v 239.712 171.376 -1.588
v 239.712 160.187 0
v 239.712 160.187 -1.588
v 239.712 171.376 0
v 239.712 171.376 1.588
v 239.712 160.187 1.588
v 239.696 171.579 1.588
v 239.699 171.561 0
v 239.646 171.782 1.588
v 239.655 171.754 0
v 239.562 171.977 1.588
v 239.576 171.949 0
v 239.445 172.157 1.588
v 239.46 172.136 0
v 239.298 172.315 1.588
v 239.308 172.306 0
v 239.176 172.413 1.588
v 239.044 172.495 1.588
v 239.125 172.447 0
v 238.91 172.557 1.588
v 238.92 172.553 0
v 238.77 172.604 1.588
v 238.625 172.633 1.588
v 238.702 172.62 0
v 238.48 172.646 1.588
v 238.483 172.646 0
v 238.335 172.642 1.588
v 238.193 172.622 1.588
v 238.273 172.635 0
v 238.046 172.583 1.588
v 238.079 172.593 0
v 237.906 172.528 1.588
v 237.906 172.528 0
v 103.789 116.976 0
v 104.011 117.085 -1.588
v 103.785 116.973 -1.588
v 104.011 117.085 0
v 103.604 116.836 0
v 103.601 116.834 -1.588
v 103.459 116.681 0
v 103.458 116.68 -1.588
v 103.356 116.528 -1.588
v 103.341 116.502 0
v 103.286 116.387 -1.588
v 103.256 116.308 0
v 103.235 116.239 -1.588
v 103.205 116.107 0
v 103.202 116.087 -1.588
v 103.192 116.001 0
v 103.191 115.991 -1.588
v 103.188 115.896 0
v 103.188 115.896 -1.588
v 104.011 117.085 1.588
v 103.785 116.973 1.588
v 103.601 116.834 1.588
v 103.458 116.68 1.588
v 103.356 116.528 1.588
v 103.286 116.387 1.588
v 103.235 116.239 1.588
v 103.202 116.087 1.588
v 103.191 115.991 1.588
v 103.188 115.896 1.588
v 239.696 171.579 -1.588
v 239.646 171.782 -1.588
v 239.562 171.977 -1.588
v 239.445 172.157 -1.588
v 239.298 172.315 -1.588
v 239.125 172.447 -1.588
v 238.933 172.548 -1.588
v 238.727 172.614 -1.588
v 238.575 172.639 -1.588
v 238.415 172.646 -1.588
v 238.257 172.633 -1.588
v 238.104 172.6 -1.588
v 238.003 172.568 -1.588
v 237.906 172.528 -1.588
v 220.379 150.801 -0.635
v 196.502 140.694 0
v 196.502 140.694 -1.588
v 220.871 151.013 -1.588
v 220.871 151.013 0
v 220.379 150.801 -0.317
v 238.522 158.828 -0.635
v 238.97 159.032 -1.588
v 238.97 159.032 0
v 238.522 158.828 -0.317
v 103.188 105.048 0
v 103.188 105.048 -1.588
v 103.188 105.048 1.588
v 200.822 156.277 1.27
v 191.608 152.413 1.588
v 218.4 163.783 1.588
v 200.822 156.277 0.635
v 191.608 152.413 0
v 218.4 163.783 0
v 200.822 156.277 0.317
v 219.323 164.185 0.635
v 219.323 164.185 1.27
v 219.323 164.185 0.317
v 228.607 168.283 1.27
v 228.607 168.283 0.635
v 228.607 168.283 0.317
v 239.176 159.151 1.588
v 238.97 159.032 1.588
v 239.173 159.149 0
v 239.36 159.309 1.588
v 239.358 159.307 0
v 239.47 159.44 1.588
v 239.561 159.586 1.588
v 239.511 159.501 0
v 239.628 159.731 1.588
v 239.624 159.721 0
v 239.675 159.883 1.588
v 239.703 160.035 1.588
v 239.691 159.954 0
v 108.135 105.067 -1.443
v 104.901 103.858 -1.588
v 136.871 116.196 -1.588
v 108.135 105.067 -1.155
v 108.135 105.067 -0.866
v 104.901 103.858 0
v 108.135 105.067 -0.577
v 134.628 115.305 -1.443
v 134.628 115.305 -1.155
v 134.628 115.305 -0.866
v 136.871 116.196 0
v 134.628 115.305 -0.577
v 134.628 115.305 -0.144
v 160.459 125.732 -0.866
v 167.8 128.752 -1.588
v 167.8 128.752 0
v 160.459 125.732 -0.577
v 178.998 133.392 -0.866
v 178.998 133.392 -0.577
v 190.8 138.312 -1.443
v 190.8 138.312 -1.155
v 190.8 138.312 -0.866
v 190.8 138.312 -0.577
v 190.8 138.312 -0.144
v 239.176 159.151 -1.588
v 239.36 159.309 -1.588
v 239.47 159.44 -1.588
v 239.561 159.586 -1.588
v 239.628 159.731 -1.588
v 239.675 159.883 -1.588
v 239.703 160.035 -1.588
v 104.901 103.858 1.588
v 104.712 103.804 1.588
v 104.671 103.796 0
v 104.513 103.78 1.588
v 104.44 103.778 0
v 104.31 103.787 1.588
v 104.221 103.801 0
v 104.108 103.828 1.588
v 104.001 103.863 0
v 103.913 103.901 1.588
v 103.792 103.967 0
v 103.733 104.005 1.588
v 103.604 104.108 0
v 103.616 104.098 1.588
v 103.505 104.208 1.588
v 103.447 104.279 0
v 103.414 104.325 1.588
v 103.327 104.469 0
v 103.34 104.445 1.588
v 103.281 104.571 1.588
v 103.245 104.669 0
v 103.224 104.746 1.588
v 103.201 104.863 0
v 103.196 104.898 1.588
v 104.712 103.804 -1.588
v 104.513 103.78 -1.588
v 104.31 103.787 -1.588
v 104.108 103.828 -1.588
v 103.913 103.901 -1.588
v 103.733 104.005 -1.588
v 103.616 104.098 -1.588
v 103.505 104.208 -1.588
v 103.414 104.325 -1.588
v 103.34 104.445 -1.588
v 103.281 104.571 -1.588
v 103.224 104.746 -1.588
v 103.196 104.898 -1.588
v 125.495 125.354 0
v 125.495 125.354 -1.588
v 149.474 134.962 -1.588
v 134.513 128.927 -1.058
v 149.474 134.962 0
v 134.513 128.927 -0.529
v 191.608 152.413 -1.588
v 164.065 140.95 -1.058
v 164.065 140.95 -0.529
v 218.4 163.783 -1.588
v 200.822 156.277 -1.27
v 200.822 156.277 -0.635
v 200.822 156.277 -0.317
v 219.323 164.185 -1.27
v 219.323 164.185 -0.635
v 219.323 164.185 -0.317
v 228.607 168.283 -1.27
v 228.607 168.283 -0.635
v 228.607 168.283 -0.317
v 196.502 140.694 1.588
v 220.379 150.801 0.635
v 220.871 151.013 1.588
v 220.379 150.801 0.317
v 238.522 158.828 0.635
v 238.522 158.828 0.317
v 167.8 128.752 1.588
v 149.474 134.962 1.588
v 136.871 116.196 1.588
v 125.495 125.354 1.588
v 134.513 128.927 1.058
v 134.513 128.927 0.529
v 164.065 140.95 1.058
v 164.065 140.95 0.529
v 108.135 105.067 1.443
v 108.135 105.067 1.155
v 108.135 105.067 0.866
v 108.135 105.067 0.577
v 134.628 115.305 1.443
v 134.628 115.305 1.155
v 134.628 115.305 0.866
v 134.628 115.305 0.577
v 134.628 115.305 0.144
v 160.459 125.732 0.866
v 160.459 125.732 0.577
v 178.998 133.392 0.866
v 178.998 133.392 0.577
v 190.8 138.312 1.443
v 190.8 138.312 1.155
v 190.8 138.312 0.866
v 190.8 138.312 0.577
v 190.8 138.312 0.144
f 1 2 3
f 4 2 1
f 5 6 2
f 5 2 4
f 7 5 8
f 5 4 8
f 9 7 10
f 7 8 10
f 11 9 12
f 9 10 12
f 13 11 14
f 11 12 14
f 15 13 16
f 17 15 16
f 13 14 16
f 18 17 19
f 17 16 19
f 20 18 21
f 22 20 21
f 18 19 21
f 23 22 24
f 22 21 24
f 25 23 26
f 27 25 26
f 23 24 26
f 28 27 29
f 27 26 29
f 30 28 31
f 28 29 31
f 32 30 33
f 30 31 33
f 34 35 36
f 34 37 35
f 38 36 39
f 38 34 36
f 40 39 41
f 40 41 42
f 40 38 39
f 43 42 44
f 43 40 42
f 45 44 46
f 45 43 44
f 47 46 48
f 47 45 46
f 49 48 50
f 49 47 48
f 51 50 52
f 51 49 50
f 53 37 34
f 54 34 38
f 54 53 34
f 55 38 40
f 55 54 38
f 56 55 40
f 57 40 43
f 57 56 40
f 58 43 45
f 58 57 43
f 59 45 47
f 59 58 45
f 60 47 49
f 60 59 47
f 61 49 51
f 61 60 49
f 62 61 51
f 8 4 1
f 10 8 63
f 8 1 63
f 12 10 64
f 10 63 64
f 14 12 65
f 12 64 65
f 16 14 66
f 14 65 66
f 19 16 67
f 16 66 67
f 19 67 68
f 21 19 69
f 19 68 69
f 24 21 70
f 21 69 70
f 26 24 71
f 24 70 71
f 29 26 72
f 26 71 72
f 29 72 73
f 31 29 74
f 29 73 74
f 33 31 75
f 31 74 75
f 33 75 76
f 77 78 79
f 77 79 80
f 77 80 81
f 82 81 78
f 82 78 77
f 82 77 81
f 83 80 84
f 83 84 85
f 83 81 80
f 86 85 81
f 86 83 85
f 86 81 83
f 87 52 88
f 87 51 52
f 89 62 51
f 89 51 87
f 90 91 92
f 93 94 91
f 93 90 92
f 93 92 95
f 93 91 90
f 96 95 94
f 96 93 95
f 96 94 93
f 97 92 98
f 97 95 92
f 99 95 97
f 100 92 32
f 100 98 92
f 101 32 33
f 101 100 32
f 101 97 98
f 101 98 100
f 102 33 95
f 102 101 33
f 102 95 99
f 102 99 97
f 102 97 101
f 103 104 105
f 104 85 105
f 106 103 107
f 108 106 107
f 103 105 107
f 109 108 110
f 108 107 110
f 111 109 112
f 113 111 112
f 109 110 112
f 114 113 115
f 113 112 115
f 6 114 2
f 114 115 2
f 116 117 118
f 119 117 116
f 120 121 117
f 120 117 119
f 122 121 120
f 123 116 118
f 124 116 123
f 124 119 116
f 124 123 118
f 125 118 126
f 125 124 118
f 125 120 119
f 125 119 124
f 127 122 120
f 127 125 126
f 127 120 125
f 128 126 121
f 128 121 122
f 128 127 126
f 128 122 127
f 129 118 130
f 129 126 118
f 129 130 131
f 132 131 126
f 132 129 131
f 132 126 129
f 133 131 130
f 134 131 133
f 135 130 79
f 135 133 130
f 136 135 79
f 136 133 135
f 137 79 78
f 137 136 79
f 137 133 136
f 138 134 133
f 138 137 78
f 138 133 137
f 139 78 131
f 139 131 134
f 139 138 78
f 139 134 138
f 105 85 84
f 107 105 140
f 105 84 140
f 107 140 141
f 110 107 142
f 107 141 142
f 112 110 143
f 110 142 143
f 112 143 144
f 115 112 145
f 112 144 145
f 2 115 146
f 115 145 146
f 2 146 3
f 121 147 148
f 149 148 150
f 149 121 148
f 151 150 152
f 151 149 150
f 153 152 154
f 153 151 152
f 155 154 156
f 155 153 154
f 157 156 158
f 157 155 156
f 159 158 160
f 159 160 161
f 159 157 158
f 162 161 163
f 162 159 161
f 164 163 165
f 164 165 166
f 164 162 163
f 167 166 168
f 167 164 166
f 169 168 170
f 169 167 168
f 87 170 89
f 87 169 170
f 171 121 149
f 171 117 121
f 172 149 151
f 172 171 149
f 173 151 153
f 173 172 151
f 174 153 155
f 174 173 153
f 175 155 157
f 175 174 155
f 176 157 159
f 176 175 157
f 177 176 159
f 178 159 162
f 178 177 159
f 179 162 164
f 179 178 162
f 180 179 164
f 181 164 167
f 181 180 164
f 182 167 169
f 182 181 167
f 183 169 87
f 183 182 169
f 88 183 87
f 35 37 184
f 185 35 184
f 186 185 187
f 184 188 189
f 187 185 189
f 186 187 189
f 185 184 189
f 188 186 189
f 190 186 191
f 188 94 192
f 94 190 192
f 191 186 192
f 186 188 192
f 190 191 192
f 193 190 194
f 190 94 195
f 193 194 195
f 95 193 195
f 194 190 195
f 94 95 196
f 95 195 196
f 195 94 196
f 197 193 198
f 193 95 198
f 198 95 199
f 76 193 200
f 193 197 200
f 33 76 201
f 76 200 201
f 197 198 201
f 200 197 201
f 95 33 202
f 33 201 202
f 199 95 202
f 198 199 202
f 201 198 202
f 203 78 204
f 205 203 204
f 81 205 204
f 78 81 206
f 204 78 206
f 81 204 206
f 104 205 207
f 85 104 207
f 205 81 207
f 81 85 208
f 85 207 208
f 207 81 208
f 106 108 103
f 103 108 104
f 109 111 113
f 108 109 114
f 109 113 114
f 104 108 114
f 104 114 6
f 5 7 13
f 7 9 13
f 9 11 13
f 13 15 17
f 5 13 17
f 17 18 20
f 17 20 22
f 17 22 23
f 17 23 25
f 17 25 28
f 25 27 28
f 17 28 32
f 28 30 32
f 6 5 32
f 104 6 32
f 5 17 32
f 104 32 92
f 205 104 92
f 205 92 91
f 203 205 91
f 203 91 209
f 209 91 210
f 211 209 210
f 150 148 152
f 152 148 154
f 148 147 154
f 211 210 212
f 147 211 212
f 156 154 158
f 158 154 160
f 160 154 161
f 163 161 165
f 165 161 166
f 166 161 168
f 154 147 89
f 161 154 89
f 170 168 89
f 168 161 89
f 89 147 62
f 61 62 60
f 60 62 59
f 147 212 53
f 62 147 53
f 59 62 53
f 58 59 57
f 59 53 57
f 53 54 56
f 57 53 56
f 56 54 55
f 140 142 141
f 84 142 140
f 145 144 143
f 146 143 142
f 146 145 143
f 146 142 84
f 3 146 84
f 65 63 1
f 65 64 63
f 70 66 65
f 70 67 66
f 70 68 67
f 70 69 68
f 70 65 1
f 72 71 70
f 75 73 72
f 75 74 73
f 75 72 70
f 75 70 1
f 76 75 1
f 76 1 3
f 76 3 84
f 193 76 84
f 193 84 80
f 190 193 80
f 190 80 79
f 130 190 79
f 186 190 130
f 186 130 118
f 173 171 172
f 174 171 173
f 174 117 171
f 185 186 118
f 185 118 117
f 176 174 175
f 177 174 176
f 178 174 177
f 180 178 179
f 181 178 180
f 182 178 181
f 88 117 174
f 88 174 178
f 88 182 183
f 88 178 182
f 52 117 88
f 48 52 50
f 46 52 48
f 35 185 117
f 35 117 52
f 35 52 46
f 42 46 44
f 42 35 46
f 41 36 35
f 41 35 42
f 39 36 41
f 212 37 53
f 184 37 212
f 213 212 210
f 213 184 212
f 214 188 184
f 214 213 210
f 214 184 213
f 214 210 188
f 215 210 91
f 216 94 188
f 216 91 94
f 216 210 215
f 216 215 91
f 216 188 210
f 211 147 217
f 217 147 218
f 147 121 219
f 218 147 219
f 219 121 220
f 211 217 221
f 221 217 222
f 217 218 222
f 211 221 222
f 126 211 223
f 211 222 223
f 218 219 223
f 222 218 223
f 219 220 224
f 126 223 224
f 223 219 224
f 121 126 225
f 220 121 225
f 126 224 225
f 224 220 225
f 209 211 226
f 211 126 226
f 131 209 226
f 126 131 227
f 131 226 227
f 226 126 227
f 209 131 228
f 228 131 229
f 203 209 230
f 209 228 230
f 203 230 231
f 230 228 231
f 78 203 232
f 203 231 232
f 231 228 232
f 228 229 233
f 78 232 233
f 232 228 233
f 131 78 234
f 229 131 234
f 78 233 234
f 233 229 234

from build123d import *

# Parameters (mm, degrees)
BOSS_EXTRUDE1_DEPTH = 1.5875
FILLET1_R           = 1.27


with BuildPart() as part:
    # Sketch1 → Boss-Extrude1 (new body, symmetric)
    with BuildSketch(Plane.XY):
        with BuildLine():
            add(Edge.make_bspline(
                [(103.1875, 116.775644737), (134.083206396, 128.359547048), (165.188742148, 141.378538978), (191.60780158, 152.412778165)],
                knots=[0.120408431, 0.120408431, 0.120408431, 0.120408431, 1, 1, 1, 1], degree=3))
            Line((103.1875, 116.775644737), (103.1875, 103.221766291))
            add(Edge.make_bspline(
                [(103.1875, 103.221766291), (104.836346711, 103.832888895), (110.910789744, 106.099289805), (121.438654787, 110.116470414), (134.654525061, 115.297088101), (147.709166263, 120.526352792), (160.514652982, 125.743699314), (170.90961349, 130.032834424), (179.016898276, 133.399089085), (184.983371131, 135.884243485), (189.84810323, 137.914627663), (193.677721798, 139.514035727), (195.557921278, 140.299392887), (196.502354723, 140.69384692)],
                knots=[0.078438404, 0.078438404, 0.078438404, 0.078438404, 0.125, 0.25, 0.375, 0.5, 0.625, 0.75, 0.8125, 0.875, 0.9375, 0.96875, 1, 1, 1, 1], degree=3))
            add(Edge.make_bspline(
                [(196.502354723, 140.69384692), (200.472258679, 142.351925244), (208.383523136, 145.67023209), (220.364202496, 150.772038823), (230.422608344, 155.16713119), (236.88583627, 158.07892828), (239.315563949, 159.190103703), (239.7125, 159.372089547)],
                knots=[14.817810364, 14.817810364, 14.817810364, 14.817810364, 16.034279138, 17.250747911, 18.467216684, 19.075451071, 19.194157176, 19.194157176, 19.194157176, 19.194157176], degree=3))
            Line((239.7125, 159.372089547), (239.7125, 173.372303785))
            Line((239.7125, 173.372303785), (239.230812588, 173.146496258))
            add(Edge.make_bspline(
                [(191.60780158, 152.412778165), (201.07340942, 156.366203579), (210.566735216, 160.366210114), (220.096436884, 164.442364028), (229.661309686, 168.660462928), (239.230812588, 173.146496258)],
                knots=[14.817810364, 14.817810364, 14.817810364, 14.817810364, 14.817810364, 14.817810364, 19.683685458, 19.683685458, 19.683685458, 19.683685458, 19.683685458, 19.683685458], degree=5))
        make_face()
    extrude(amount=BOSS_EXTRUDE1_DEPTH, both=True)

    # Fillet1
    fillet1_edges = [part.edges().sort_by_distance(p)[0] for p in [
        (239.7125, 159.372089547, -0.79375),
        (239.7125, 173.372303785, 0),
        (103.1875, 103.221766291, -0.79375),
        (103.1875, 116.775644737, 0.79375),
    ]]
    fillet(fillet1_edges, radius=FILLET1_R)


solid = part.part
